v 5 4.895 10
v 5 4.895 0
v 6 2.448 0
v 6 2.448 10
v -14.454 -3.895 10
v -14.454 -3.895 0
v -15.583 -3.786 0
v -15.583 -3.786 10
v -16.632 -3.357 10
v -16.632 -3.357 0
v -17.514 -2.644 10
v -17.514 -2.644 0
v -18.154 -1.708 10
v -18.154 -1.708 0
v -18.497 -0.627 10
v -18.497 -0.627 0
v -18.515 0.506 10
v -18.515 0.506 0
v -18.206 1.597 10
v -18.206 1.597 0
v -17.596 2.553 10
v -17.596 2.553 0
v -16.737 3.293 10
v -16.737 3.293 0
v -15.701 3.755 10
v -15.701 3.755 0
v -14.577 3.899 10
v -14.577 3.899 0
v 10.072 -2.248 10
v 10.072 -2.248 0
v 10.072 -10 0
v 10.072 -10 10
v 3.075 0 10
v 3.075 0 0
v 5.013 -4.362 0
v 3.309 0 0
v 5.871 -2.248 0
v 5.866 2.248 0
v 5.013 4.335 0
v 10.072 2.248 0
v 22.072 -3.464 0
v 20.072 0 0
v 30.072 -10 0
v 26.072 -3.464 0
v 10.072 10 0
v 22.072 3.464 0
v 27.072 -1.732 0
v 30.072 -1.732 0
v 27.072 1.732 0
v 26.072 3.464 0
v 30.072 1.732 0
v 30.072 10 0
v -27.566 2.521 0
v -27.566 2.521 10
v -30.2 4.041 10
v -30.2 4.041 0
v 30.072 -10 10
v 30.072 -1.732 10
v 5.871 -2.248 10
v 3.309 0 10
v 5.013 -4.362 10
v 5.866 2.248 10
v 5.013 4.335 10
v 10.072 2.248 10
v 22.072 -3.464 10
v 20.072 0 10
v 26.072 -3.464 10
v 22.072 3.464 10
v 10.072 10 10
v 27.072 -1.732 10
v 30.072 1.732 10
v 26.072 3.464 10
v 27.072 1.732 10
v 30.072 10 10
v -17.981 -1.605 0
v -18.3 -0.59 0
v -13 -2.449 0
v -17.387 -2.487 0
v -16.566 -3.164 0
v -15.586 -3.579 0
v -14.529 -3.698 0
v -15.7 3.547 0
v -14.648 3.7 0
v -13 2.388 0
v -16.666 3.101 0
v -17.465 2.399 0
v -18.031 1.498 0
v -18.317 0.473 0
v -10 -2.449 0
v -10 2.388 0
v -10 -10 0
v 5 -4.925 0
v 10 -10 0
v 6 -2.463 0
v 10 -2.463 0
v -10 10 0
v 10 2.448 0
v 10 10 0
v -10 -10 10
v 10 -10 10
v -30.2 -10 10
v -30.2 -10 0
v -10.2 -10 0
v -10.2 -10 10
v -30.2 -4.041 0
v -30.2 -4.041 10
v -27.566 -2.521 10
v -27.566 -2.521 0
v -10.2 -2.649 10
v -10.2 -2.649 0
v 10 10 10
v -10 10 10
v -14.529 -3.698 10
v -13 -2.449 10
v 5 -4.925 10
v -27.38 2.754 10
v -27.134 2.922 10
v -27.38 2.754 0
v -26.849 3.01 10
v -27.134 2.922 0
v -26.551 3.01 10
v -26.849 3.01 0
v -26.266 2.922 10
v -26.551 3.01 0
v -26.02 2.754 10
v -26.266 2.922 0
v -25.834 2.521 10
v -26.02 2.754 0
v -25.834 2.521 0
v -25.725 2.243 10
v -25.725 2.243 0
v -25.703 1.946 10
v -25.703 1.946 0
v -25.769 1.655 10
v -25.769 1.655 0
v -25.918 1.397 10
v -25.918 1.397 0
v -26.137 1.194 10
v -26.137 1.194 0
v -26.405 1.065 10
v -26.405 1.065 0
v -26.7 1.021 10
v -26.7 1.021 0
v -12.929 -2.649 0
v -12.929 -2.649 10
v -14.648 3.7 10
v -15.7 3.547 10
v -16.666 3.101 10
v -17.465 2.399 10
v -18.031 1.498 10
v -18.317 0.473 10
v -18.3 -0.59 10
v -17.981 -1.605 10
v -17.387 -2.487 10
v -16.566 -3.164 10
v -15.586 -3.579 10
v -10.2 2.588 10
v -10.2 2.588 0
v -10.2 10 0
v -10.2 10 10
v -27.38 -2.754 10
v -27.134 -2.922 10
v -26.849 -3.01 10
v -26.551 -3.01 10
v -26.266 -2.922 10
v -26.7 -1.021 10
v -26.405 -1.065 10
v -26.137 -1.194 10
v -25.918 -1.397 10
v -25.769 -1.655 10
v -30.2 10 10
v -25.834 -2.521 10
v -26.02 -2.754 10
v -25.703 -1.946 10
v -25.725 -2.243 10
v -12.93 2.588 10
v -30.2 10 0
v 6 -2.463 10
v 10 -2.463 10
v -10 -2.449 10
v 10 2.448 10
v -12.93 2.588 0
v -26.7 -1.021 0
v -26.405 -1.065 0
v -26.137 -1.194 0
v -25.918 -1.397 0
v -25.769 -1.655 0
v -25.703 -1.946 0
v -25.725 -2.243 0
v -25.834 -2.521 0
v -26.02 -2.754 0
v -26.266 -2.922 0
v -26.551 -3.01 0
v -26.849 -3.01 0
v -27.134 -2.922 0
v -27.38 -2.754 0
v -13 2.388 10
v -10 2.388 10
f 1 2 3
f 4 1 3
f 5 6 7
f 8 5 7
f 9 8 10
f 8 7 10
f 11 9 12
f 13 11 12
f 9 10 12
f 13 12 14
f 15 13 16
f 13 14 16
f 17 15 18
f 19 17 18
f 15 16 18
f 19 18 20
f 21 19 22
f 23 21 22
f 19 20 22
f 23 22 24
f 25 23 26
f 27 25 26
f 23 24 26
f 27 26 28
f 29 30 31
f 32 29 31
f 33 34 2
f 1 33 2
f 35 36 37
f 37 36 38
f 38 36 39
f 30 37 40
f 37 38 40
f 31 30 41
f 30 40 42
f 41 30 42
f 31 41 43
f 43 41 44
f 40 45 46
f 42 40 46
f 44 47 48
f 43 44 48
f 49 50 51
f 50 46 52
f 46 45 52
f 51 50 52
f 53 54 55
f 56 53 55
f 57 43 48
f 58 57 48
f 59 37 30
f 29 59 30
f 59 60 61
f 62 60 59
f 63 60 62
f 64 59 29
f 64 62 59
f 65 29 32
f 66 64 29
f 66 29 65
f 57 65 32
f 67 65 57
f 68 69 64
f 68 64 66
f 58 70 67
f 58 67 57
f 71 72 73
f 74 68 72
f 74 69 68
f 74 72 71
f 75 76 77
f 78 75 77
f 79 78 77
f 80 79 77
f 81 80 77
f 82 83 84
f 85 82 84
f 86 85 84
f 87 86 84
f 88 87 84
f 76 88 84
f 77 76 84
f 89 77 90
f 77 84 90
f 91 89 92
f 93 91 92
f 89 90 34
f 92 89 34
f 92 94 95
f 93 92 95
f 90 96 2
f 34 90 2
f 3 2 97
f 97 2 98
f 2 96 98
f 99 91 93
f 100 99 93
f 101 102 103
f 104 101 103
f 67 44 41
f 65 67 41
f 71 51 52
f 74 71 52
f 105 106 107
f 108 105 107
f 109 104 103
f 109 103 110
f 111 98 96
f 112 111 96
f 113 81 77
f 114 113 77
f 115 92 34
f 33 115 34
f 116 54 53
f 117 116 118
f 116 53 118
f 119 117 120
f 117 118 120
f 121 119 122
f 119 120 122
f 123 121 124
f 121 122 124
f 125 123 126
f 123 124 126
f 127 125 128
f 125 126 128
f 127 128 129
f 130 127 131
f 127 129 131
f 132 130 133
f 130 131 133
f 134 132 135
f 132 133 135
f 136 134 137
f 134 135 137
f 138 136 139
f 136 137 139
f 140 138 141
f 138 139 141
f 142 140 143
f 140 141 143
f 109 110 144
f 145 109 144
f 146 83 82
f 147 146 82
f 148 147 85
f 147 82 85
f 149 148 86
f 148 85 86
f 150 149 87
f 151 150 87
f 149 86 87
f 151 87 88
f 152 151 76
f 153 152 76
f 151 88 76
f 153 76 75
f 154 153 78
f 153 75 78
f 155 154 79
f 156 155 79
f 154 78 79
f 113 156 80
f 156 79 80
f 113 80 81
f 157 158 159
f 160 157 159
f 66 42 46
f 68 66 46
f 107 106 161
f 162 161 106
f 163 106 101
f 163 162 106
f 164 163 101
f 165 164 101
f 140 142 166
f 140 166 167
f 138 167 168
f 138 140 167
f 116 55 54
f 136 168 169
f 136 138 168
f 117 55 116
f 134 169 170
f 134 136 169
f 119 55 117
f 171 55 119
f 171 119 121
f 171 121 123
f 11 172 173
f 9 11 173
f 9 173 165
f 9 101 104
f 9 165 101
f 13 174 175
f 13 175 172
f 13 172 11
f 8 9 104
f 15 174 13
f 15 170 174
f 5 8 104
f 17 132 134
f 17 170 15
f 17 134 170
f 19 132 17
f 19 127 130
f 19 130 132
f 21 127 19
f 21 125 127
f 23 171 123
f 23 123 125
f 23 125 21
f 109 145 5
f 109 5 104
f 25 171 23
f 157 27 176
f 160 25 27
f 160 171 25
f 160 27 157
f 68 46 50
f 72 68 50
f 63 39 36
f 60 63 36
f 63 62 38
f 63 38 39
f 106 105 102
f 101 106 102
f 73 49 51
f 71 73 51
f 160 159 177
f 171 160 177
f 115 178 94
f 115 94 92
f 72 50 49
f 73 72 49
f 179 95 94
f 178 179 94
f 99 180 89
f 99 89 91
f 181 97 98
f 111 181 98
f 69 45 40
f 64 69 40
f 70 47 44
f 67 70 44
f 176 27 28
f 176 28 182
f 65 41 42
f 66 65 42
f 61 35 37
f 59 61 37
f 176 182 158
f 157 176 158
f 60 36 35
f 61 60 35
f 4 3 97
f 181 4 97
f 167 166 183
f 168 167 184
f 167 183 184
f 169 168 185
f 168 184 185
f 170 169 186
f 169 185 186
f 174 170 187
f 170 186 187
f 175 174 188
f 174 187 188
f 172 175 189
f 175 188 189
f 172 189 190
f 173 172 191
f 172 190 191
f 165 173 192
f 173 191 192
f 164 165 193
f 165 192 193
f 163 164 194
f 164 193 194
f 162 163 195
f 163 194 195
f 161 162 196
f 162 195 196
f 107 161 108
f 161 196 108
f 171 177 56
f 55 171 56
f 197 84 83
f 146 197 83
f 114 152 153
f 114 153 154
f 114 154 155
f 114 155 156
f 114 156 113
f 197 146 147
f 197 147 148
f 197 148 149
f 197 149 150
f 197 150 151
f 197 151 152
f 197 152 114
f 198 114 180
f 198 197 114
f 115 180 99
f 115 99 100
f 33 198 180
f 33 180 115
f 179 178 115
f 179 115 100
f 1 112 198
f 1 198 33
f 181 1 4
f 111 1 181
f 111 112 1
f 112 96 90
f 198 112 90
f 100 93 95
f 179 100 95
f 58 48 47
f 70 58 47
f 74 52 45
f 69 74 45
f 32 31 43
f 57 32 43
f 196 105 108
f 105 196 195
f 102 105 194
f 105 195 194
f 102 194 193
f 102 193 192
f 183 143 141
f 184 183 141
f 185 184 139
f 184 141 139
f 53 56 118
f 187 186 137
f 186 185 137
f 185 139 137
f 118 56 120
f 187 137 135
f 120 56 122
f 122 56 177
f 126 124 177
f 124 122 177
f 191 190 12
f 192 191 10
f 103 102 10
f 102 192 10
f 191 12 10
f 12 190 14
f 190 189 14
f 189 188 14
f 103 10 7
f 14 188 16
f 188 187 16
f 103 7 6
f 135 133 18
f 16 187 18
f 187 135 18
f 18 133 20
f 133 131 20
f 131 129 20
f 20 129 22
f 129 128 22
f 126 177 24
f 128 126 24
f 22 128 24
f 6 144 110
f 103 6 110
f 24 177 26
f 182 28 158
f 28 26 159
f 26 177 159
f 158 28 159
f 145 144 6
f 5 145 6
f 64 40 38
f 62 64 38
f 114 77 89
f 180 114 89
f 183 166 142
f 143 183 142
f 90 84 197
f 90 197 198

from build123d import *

# Parameters (mm, degrees)
F0_W     = 3
F0_H     = 2.449472
F0_H_2   = 2.388333
F1_DEPTH = 10
F4_DEPTH = 10
F5_DEPTH = 10
F7_DEPTH = 10.001
F8_R     = 1
F9_DEPTH = 10.001


with BuildPart() as f1:
    # F0 (on Top) → F1 (new body)
    with BuildSketch(Plane.XY):
        with BuildLine():
            Line((-13, -2.449472), (-13, 0))
            Line((-13, 0), (-14.647593, 0))
            Line((-14.647593, 0), (-14.647593, 3.7))
            ThreePointArc((-14.647593, 3.7), (-18.34712, -0.059169), (-14.52927, -3.698108))
            Line((-14.52927, -3.698108), (-13, -2.449472))
        make_face()
        Polygon((-13, 0), (-13, 2.388333), (-14.647593, 3.7), (-14.647593, 0), align=None)
        with Locations((-11.5, -1.224736)):
            Rectangle(F0_W, F0_H)
        with Locations((-11.5, 1.194166)):
            Rectangle(F0_W, F0_H_2)
        Polygon((10, 4.895196), (10, 10), (-10, 10), (-10, 2.388333), (-10, 0), (-10, -2.449472), (-10, -10), (10, -10), (10, -4.925328), (5, -4.925328), (3.075398, 0), (5, 4.895196), align=None)
        Polygon((10, -4.925328), (10, -2.462664), (6, -2.462664), (5, -4.925328), align=None)
        Polygon((10, 2.447598), (10, 4.895196), (5, 4.895196), (6, 2.447598), align=None)
    extrude(amount=F1_DEPTH)


with BuildPart() as f4:
    # F2 (on Top) → F4 (new body)
    with BuildSketch(Plane.XY):
        Polygon((30.071606, 10), (10.071606, 10), (10.071606, 2.247598), (10.071606, 1.537336), (10.071606, -2.247598), (10.071606, -2.462664), (10.071606, -10), (30.071606, -10), (30.071606, -1.732051), (27.071606, -1.732051), (26.071606, -3.464102), (22.071606, -3.464102), (20.071606, 0), (22.071606, 3.464102), (26.071606, 3.464102), (27.071606, 1.732051), (30.071606, 1.732051), align=None)
        Polygon((10.071606, 1.537336), (10.071606, 2.247598), (5.865853, 2.247598), (4.567088, 2.247598), (4.567088, -2.247598), (5.871471, -2.247598), (10.071606, -2.247598), align=None)
        Polygon((4.567088, 2.247598), (5.865853, 2.247598), (5.01304, 4.334941), (3.308709, 0), (5.01304, -4.361624), (5.871471, -2.247598), (4.567088, -2.247598), align=None)
    extrude(amount=F4_DEPTH)


with BuildPart() as f5:
    # F3 (on face) → F5 (new body, through all)
    with BuildSketch(Plane.XY):
        with BuildLine():
            ThreePointArc((-14.454449, -3.895214), (-18.547112, -0.06126), (-14.576899, 3.899359))
            Line((-14.576899, 3.899359), (-12.93011, 2.588333))
            Line((-12.93011, 2.588333), (-10.2, 2.588333))
            Line((-10.2, 2.588333), (-10.2, 10))
            Line((-10.2, 10), (-30.2, 10))
            Line((-30.2, 10), (-30.2, -10))
            Line((-30.2, -10), (-10.2, -10))
            Line((-10.2, -10), (-10.2, -2.649472))
            Line((-10.2, -2.649472), (-12.928722, -2.649472))
            Line((-12.928722, -2.649472), (-14.454449, -3.895214))
        make_face()
    extrude(amount=F5_DEPTH)

    # F6 (on face) → F7 (cut, through all)
    with BuildSketch(Plane.XY.offset(10)):
        Polygon((-26.7, -2.020726), (-26.7, 2.020726), (-30.2, 4.041452), (-33.7, 2.020726), (-33.7, -2.020726), (-30.2, -4.041452), align=None)
    extrude(amount=-F7_DEPTH, mode=Mode.SUBTRACT)

    # F8 (on face) → F9 (cut, through all)
    with BuildSketch(Plane(origin=(0, 0, 0), x_dir=(1, 0, 0), z_dir=(0, 0, -1))):
        with Locations((-26.7, -2.020726)):
            Circle(F8_R)
        with Locations((-26.7, 2.020726)):
            Circle(F8_R)
    extrude(amount=-F9_DEPTH, mode=Mode.SUBTRACT)


solid = Compound([f1.part, f4.part, f5.part])
